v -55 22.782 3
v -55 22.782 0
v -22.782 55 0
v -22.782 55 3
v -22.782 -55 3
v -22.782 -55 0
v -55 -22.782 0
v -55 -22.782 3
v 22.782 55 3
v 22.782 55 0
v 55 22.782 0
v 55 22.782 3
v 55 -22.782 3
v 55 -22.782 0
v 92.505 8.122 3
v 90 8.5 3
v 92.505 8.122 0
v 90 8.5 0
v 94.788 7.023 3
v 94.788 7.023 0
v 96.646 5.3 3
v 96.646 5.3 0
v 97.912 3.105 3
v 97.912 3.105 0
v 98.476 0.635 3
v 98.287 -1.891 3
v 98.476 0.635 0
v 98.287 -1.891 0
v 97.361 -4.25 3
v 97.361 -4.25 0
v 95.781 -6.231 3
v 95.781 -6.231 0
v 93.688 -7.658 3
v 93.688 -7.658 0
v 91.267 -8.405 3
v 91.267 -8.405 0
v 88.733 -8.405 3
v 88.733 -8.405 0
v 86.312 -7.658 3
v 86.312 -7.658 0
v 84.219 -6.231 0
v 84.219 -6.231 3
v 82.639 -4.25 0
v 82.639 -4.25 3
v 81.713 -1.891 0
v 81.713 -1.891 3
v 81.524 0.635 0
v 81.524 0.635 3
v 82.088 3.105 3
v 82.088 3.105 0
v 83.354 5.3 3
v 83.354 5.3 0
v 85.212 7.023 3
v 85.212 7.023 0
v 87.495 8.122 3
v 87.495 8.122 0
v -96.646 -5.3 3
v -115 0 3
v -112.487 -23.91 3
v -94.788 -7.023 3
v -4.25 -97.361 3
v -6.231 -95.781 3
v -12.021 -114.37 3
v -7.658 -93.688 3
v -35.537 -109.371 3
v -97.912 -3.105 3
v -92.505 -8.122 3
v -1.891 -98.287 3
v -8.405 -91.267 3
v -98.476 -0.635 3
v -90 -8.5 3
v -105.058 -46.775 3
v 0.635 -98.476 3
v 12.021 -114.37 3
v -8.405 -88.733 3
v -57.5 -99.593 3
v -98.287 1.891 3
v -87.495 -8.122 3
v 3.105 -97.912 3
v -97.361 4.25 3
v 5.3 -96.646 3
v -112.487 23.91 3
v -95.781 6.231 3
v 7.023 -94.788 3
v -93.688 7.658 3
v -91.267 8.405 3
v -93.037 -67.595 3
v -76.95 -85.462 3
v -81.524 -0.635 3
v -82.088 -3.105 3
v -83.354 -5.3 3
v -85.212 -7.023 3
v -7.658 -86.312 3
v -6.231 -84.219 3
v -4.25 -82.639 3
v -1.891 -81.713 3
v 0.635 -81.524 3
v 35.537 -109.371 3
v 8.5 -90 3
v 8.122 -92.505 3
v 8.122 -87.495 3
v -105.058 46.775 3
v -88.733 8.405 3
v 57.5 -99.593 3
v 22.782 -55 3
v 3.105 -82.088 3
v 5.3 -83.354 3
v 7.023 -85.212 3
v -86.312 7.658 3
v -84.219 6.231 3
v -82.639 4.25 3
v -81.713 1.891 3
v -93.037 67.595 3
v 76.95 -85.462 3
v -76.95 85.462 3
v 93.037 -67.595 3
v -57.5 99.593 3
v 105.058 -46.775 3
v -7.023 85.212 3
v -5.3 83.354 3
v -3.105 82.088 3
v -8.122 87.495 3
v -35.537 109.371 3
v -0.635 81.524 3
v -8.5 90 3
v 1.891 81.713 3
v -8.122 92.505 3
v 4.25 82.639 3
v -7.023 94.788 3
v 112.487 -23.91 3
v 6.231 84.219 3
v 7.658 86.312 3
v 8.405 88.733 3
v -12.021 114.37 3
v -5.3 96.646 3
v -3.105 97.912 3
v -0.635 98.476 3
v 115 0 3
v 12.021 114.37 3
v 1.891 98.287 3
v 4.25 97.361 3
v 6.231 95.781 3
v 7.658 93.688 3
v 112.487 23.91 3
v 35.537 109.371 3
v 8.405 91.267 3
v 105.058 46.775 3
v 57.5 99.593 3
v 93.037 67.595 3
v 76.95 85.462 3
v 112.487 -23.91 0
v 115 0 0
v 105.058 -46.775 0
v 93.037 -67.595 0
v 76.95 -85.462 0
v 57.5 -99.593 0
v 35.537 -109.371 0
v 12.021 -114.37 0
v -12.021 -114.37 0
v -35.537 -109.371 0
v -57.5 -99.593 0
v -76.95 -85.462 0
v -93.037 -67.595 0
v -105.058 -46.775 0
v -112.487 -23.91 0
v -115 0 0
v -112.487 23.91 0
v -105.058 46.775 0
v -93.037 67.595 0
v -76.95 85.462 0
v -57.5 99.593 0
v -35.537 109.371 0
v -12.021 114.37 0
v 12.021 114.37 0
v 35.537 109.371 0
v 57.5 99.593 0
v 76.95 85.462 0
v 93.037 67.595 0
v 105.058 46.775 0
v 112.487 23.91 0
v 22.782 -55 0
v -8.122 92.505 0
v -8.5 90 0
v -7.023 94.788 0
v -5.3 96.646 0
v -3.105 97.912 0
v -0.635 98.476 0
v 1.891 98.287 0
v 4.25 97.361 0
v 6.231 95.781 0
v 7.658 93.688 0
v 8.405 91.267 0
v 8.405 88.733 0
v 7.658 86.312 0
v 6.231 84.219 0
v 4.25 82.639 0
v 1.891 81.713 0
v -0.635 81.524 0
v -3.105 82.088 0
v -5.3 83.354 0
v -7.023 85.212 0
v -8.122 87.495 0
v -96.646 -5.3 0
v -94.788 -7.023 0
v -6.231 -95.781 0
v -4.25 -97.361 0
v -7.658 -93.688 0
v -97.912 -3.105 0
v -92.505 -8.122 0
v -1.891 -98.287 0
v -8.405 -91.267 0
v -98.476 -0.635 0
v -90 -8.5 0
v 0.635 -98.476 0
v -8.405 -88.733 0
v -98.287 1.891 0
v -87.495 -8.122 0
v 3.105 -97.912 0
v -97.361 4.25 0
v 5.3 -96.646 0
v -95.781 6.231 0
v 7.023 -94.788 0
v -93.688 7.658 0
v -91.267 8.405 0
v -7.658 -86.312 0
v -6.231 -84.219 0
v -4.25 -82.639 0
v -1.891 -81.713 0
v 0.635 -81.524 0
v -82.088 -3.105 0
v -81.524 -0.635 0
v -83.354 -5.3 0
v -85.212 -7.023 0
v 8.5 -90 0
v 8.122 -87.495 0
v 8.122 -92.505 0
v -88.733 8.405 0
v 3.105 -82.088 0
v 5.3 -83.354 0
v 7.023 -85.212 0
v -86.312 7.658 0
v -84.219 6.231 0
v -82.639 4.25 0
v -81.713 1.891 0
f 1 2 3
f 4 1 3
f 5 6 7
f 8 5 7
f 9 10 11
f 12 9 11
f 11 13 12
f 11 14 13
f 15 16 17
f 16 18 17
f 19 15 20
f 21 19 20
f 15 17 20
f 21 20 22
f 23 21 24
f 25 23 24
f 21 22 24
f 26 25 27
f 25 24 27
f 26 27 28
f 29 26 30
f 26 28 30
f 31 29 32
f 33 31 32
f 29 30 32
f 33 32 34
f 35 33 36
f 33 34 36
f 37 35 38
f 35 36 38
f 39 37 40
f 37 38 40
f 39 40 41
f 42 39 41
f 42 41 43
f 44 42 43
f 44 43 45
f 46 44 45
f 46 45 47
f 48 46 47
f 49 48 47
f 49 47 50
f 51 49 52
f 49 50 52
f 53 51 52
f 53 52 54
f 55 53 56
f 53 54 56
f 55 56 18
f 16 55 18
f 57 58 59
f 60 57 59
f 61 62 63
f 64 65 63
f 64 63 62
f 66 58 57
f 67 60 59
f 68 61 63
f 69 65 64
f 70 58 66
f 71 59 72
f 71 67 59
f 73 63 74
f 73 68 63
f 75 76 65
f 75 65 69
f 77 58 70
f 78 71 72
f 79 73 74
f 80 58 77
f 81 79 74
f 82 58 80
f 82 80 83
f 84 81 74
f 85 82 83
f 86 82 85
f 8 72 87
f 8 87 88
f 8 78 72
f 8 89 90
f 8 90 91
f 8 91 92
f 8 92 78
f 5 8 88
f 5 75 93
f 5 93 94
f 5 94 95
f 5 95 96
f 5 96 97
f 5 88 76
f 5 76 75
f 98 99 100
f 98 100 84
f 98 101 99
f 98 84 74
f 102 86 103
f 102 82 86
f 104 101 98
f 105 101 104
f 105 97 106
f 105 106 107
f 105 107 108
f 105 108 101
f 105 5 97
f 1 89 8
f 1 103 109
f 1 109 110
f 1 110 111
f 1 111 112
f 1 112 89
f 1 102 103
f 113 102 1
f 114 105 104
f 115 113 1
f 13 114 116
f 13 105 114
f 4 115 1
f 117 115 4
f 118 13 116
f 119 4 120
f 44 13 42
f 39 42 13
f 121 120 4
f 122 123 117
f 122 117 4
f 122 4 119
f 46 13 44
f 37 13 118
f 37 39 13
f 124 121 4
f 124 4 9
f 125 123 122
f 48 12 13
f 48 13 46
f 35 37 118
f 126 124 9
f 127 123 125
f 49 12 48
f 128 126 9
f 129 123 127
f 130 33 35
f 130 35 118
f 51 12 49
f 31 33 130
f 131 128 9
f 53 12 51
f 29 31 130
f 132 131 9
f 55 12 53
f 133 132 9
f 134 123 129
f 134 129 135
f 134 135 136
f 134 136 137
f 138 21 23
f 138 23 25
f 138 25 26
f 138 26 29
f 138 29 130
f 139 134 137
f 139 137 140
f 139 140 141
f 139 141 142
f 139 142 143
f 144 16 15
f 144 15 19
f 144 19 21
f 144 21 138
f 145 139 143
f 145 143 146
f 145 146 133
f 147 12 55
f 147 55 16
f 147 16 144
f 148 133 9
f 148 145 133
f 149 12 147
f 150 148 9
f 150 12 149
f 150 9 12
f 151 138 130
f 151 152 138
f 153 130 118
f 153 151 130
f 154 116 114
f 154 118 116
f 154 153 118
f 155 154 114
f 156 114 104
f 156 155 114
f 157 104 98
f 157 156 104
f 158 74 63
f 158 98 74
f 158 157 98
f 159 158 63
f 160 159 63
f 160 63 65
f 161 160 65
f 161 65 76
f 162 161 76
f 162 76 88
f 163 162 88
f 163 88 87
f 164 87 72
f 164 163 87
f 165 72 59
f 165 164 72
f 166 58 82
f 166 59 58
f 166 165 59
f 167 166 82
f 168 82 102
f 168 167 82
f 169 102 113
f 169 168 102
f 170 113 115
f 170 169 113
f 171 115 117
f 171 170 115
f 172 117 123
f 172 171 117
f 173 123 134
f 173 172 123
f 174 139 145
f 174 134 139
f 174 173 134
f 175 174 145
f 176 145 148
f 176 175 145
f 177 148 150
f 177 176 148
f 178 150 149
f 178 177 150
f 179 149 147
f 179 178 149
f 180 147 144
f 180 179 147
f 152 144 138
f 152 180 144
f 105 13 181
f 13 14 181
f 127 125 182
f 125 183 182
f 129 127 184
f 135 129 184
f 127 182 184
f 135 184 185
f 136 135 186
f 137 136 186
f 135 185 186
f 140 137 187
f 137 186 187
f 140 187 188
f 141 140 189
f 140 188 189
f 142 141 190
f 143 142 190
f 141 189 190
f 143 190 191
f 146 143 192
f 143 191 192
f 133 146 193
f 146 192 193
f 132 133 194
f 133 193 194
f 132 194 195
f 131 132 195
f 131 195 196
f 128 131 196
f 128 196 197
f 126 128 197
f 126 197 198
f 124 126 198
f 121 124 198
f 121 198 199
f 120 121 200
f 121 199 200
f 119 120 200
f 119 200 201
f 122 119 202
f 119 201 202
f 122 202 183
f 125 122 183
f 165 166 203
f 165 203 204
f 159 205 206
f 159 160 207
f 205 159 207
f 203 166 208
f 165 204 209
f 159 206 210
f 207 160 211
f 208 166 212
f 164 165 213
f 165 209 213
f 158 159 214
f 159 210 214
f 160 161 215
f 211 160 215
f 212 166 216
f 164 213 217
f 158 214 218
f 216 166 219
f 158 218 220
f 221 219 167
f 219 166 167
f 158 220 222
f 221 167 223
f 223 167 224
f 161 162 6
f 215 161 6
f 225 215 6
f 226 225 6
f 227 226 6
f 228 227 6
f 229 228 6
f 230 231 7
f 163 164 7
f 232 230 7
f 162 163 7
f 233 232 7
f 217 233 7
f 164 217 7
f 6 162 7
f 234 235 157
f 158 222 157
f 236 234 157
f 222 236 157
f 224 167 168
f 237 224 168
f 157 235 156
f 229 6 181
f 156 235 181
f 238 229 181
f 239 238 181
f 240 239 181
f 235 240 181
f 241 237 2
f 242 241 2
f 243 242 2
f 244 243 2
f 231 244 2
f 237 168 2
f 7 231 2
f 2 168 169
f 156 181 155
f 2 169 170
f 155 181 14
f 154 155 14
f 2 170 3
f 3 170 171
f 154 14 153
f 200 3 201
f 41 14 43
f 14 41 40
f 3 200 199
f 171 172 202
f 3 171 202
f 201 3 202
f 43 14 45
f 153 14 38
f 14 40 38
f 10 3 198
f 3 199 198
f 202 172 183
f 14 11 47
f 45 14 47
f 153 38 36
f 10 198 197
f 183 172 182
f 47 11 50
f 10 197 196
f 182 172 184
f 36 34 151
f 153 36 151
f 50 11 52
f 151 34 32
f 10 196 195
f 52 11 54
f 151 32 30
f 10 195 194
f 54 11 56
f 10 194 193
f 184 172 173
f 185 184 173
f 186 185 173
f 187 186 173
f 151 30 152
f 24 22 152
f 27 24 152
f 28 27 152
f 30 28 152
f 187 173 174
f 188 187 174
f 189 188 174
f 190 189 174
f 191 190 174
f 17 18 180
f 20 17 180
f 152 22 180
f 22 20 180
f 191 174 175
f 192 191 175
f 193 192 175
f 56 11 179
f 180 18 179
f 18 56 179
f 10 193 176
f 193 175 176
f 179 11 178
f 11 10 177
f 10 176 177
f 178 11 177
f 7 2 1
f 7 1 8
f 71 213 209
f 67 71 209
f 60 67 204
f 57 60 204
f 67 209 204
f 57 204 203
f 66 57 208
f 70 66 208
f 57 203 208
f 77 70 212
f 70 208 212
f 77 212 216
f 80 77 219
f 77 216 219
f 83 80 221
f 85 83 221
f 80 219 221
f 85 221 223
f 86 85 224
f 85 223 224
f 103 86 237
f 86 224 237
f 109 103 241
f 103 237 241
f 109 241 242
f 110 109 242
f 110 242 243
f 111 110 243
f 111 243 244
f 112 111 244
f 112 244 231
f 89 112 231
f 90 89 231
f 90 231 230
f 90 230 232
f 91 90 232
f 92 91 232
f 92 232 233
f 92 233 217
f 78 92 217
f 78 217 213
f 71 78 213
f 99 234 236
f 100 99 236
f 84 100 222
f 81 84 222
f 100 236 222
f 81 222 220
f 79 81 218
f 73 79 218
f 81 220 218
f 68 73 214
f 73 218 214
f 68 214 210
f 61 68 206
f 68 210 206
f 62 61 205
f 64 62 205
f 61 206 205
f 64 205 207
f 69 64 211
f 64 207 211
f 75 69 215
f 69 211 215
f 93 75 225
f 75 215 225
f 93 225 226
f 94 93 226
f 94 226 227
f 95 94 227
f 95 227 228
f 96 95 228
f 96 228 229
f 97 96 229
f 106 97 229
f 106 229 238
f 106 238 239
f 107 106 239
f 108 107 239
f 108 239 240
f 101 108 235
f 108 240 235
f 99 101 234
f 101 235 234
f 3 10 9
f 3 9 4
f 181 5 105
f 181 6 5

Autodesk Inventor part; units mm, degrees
ref_plane "YZ Plane" through (0, 0, 0) normal (1, 0, 0) x (0, 1, 0)
ref_plane "XZ Plane" through (0, 0, 0) normal (0, 1, 0) x (-1, 0, 0)
ref_plane "XY Plane" through (0, 0, 0) normal (0, 0, 1) x (1, 0, 0)
sketch "Sketch1" plane through (0, 0, 0) normal (0, 0, 1) x (1, 0, 0)
  circle A0 centre (0, 0) radius 115
  line L0 (55, 55) -> (-55, 55)
  line L1 (-55, 55) -> (-55, -55)
  line L2 (-55, -55) -> (55, -55)
  line L3 (55, -55) -> (55, 55)
  line L4 (55, 55) -> (-55, -55) construction
  line L5 (-55, 55) -> (55, -55) construction
  line L6 (-55, 22.7817) -> (-22.7817, 55)
  line L7 (22.7817, 55) -> (55, 22.7817)
  line L8 (55, -22.7817) -> (22.7817, -55)
  line L9 (-22.7817, -55) -> (-55, -22.7817)
  dimension "d157" = 230
  dimension "d158" = 110
  dimension "d159" = 110
  dimension "d171" = 110
  dimension "d172" = 110
extrude "Plate5" add sketch "Sketch1" along normal blind 3 contours A0 | L3 L7 L0 | L6 L1 L0 | L3 L2 L8 | L9 L2 L1
sketch "Sketch7" plane through (0, 0, 0) normal (0, 0, -1) x (-1, 0, 0)
  circle A0 centre (0, 90) radius 8.5
  circle A1 centre (0, 0) radius 90 construction
  dimension "d170" = 180
  dimension "d160" = 17
extrude "Cut1" cut sketch "Sketch7" against normal blind 3
pattern_circular "Circular Pattern1" count 4 over 360 about axis through (0, 0, -10) along (0, 0, 1) of "Cut1"
properties part number "APN 1472  funnel FLANGE 1200 50-90" material "Stainless Steel"
